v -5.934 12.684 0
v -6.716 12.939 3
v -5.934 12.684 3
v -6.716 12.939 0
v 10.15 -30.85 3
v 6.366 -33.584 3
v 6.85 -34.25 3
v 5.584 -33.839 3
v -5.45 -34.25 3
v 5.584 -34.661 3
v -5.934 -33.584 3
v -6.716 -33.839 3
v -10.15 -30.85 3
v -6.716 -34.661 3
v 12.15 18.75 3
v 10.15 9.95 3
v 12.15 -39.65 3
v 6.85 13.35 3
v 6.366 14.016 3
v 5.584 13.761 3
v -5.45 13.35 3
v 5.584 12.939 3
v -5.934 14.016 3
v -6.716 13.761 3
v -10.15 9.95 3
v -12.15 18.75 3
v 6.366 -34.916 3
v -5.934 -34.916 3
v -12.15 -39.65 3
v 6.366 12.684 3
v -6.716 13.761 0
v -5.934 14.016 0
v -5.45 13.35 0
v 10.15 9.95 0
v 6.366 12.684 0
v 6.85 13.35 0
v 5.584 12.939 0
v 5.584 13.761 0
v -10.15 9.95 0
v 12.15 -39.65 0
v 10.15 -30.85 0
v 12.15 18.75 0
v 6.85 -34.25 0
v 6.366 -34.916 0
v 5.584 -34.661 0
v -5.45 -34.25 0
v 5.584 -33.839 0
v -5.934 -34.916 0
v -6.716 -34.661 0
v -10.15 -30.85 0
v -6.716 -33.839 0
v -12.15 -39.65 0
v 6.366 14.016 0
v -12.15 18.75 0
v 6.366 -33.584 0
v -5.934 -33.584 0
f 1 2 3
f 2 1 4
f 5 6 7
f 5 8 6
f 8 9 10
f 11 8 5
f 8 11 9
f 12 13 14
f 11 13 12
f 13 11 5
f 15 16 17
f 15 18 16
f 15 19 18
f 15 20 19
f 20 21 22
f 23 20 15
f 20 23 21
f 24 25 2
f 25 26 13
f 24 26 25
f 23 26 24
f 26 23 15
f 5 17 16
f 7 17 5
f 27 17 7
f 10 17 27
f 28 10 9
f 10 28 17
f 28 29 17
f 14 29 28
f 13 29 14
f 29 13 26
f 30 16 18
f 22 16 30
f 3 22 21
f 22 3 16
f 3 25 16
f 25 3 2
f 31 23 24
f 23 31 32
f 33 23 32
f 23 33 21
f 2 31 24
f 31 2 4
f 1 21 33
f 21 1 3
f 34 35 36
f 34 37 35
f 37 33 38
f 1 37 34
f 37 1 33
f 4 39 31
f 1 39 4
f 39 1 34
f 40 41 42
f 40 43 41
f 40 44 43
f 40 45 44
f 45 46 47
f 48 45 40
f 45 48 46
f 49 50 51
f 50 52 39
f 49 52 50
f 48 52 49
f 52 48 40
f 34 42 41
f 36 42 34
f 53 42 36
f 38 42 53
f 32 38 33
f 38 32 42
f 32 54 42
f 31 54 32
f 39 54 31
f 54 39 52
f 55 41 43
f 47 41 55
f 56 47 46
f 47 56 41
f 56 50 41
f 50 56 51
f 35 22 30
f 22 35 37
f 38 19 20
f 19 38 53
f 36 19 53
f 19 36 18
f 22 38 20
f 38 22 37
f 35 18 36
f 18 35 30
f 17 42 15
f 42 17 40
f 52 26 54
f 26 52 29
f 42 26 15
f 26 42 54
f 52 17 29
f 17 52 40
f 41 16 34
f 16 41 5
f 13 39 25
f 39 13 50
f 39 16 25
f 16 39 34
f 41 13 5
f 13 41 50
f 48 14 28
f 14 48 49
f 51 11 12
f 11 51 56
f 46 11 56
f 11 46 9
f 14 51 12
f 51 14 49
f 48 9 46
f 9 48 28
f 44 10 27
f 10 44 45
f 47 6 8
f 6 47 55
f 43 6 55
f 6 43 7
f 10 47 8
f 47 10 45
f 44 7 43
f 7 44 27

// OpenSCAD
// file: ../buildvars.scad
function cube_size() = 56;
function tolerance() = 0.2;
function screw_r() = 3/2;
function arm_width() = 7;
function arm_length() = 35;
function servo_base_height() = 4;
function servo_elevation() = 5;
function gear_r() = 11;
function arm_c2c() = gear_r()*2.35;

function arm_inset_x() = arm_width() + 2;
function arm_inset_y() = gear_r()+arm_width();

function back_x() = 4.31*2;
function back_y() = -gear_r()-10;
function base_rounding_radius() = 7;
function nut_h() = 2.3;

function grip_pad_h() = servo_base_height();

function back_h() = nut_h()+servo_elevation()+2*servo_base_height();
function gripper_r() = back_h()/2;
function turn_h() = 30;
function turn_gap_h() = 5;
function turn_gap_d() = 2;
function turn_br() = base_rounding_radius();
function turn_sr() = turn_br()/2;
function turn_mr() = (turn_br()+turn_sr())/2;
function turn_pad() = 2;
function turn_gear_r() = 6;



function sh_r() = 8/2;
function sh_h() = 3;
function sh_w() = 10;


function holder_h() = 80; // height to center
function holder_d() = turn_h();
function holder_th() = 8;
function holder_w() = gripper_r()*2+holder_th()*2;
function holder_dst() = 183;


function gears_c2c() = 36;
function gear_conversion_factor() = 1; // old = 0.67;
function gear_round() = true;

function base_r() = (gears_c2c()-3)/2;
function servo_gear_f() = 2/(gear_conversion_factor()+1)*gear_conversion_factor();
function turn_gear_f() = 2-servo_gear_f();
function turn_gear_r() = base_r() * turn_gear_f();
function servo_gear_r() = base_r() * servo_gear_f();

function rail_sep_w() = sh_w()/4;

function arm_height() = 5;
// main file
use <../buildvars.scad>

module servo_adapter(th1=2, th2=2, eh=3, extra=15) {
    pad = .4;
    r = 19.9 / 2;
    d = r*2 + pad;
    w1 = 40.4 + pad;
    w2 = 54 + pad;
    sw = (w2-w1)/2;
    h2 = 49; // height with horn inserted
    screw_r = .7;
    screw_d = 4;
    
    translate([-d/2-th1,-w2/2-th2-w1/2+r,0])
    difference() {
        cube([d,w2+extra,eh]+[th1,th2,0]*2);
        translate([0,sw,0]+[th1,th2,0])
        cube([d,w1,eh]);
        
        translate([th1,th2+sw/2,0]+[screw_d,0,0]) cylinder(r=screw_r, h=eh);
        translate([th1,th2+sw/2,0]+[d-screw_d,0,0]) cylinder(r=screw_r, h=eh);
        translate([0,w1+sw,0]) {
            translate([th1,th2+sw/2,0]+[screw_d,0,0]) cylinder(r=screw_r, h=eh);
            translate([th1,th2+sw/2,0]+[d-screw_d,0,0]) cylinder(r=screw_r, h=eh);
        }
    }
    
}

servo_adapter(extra=0);
